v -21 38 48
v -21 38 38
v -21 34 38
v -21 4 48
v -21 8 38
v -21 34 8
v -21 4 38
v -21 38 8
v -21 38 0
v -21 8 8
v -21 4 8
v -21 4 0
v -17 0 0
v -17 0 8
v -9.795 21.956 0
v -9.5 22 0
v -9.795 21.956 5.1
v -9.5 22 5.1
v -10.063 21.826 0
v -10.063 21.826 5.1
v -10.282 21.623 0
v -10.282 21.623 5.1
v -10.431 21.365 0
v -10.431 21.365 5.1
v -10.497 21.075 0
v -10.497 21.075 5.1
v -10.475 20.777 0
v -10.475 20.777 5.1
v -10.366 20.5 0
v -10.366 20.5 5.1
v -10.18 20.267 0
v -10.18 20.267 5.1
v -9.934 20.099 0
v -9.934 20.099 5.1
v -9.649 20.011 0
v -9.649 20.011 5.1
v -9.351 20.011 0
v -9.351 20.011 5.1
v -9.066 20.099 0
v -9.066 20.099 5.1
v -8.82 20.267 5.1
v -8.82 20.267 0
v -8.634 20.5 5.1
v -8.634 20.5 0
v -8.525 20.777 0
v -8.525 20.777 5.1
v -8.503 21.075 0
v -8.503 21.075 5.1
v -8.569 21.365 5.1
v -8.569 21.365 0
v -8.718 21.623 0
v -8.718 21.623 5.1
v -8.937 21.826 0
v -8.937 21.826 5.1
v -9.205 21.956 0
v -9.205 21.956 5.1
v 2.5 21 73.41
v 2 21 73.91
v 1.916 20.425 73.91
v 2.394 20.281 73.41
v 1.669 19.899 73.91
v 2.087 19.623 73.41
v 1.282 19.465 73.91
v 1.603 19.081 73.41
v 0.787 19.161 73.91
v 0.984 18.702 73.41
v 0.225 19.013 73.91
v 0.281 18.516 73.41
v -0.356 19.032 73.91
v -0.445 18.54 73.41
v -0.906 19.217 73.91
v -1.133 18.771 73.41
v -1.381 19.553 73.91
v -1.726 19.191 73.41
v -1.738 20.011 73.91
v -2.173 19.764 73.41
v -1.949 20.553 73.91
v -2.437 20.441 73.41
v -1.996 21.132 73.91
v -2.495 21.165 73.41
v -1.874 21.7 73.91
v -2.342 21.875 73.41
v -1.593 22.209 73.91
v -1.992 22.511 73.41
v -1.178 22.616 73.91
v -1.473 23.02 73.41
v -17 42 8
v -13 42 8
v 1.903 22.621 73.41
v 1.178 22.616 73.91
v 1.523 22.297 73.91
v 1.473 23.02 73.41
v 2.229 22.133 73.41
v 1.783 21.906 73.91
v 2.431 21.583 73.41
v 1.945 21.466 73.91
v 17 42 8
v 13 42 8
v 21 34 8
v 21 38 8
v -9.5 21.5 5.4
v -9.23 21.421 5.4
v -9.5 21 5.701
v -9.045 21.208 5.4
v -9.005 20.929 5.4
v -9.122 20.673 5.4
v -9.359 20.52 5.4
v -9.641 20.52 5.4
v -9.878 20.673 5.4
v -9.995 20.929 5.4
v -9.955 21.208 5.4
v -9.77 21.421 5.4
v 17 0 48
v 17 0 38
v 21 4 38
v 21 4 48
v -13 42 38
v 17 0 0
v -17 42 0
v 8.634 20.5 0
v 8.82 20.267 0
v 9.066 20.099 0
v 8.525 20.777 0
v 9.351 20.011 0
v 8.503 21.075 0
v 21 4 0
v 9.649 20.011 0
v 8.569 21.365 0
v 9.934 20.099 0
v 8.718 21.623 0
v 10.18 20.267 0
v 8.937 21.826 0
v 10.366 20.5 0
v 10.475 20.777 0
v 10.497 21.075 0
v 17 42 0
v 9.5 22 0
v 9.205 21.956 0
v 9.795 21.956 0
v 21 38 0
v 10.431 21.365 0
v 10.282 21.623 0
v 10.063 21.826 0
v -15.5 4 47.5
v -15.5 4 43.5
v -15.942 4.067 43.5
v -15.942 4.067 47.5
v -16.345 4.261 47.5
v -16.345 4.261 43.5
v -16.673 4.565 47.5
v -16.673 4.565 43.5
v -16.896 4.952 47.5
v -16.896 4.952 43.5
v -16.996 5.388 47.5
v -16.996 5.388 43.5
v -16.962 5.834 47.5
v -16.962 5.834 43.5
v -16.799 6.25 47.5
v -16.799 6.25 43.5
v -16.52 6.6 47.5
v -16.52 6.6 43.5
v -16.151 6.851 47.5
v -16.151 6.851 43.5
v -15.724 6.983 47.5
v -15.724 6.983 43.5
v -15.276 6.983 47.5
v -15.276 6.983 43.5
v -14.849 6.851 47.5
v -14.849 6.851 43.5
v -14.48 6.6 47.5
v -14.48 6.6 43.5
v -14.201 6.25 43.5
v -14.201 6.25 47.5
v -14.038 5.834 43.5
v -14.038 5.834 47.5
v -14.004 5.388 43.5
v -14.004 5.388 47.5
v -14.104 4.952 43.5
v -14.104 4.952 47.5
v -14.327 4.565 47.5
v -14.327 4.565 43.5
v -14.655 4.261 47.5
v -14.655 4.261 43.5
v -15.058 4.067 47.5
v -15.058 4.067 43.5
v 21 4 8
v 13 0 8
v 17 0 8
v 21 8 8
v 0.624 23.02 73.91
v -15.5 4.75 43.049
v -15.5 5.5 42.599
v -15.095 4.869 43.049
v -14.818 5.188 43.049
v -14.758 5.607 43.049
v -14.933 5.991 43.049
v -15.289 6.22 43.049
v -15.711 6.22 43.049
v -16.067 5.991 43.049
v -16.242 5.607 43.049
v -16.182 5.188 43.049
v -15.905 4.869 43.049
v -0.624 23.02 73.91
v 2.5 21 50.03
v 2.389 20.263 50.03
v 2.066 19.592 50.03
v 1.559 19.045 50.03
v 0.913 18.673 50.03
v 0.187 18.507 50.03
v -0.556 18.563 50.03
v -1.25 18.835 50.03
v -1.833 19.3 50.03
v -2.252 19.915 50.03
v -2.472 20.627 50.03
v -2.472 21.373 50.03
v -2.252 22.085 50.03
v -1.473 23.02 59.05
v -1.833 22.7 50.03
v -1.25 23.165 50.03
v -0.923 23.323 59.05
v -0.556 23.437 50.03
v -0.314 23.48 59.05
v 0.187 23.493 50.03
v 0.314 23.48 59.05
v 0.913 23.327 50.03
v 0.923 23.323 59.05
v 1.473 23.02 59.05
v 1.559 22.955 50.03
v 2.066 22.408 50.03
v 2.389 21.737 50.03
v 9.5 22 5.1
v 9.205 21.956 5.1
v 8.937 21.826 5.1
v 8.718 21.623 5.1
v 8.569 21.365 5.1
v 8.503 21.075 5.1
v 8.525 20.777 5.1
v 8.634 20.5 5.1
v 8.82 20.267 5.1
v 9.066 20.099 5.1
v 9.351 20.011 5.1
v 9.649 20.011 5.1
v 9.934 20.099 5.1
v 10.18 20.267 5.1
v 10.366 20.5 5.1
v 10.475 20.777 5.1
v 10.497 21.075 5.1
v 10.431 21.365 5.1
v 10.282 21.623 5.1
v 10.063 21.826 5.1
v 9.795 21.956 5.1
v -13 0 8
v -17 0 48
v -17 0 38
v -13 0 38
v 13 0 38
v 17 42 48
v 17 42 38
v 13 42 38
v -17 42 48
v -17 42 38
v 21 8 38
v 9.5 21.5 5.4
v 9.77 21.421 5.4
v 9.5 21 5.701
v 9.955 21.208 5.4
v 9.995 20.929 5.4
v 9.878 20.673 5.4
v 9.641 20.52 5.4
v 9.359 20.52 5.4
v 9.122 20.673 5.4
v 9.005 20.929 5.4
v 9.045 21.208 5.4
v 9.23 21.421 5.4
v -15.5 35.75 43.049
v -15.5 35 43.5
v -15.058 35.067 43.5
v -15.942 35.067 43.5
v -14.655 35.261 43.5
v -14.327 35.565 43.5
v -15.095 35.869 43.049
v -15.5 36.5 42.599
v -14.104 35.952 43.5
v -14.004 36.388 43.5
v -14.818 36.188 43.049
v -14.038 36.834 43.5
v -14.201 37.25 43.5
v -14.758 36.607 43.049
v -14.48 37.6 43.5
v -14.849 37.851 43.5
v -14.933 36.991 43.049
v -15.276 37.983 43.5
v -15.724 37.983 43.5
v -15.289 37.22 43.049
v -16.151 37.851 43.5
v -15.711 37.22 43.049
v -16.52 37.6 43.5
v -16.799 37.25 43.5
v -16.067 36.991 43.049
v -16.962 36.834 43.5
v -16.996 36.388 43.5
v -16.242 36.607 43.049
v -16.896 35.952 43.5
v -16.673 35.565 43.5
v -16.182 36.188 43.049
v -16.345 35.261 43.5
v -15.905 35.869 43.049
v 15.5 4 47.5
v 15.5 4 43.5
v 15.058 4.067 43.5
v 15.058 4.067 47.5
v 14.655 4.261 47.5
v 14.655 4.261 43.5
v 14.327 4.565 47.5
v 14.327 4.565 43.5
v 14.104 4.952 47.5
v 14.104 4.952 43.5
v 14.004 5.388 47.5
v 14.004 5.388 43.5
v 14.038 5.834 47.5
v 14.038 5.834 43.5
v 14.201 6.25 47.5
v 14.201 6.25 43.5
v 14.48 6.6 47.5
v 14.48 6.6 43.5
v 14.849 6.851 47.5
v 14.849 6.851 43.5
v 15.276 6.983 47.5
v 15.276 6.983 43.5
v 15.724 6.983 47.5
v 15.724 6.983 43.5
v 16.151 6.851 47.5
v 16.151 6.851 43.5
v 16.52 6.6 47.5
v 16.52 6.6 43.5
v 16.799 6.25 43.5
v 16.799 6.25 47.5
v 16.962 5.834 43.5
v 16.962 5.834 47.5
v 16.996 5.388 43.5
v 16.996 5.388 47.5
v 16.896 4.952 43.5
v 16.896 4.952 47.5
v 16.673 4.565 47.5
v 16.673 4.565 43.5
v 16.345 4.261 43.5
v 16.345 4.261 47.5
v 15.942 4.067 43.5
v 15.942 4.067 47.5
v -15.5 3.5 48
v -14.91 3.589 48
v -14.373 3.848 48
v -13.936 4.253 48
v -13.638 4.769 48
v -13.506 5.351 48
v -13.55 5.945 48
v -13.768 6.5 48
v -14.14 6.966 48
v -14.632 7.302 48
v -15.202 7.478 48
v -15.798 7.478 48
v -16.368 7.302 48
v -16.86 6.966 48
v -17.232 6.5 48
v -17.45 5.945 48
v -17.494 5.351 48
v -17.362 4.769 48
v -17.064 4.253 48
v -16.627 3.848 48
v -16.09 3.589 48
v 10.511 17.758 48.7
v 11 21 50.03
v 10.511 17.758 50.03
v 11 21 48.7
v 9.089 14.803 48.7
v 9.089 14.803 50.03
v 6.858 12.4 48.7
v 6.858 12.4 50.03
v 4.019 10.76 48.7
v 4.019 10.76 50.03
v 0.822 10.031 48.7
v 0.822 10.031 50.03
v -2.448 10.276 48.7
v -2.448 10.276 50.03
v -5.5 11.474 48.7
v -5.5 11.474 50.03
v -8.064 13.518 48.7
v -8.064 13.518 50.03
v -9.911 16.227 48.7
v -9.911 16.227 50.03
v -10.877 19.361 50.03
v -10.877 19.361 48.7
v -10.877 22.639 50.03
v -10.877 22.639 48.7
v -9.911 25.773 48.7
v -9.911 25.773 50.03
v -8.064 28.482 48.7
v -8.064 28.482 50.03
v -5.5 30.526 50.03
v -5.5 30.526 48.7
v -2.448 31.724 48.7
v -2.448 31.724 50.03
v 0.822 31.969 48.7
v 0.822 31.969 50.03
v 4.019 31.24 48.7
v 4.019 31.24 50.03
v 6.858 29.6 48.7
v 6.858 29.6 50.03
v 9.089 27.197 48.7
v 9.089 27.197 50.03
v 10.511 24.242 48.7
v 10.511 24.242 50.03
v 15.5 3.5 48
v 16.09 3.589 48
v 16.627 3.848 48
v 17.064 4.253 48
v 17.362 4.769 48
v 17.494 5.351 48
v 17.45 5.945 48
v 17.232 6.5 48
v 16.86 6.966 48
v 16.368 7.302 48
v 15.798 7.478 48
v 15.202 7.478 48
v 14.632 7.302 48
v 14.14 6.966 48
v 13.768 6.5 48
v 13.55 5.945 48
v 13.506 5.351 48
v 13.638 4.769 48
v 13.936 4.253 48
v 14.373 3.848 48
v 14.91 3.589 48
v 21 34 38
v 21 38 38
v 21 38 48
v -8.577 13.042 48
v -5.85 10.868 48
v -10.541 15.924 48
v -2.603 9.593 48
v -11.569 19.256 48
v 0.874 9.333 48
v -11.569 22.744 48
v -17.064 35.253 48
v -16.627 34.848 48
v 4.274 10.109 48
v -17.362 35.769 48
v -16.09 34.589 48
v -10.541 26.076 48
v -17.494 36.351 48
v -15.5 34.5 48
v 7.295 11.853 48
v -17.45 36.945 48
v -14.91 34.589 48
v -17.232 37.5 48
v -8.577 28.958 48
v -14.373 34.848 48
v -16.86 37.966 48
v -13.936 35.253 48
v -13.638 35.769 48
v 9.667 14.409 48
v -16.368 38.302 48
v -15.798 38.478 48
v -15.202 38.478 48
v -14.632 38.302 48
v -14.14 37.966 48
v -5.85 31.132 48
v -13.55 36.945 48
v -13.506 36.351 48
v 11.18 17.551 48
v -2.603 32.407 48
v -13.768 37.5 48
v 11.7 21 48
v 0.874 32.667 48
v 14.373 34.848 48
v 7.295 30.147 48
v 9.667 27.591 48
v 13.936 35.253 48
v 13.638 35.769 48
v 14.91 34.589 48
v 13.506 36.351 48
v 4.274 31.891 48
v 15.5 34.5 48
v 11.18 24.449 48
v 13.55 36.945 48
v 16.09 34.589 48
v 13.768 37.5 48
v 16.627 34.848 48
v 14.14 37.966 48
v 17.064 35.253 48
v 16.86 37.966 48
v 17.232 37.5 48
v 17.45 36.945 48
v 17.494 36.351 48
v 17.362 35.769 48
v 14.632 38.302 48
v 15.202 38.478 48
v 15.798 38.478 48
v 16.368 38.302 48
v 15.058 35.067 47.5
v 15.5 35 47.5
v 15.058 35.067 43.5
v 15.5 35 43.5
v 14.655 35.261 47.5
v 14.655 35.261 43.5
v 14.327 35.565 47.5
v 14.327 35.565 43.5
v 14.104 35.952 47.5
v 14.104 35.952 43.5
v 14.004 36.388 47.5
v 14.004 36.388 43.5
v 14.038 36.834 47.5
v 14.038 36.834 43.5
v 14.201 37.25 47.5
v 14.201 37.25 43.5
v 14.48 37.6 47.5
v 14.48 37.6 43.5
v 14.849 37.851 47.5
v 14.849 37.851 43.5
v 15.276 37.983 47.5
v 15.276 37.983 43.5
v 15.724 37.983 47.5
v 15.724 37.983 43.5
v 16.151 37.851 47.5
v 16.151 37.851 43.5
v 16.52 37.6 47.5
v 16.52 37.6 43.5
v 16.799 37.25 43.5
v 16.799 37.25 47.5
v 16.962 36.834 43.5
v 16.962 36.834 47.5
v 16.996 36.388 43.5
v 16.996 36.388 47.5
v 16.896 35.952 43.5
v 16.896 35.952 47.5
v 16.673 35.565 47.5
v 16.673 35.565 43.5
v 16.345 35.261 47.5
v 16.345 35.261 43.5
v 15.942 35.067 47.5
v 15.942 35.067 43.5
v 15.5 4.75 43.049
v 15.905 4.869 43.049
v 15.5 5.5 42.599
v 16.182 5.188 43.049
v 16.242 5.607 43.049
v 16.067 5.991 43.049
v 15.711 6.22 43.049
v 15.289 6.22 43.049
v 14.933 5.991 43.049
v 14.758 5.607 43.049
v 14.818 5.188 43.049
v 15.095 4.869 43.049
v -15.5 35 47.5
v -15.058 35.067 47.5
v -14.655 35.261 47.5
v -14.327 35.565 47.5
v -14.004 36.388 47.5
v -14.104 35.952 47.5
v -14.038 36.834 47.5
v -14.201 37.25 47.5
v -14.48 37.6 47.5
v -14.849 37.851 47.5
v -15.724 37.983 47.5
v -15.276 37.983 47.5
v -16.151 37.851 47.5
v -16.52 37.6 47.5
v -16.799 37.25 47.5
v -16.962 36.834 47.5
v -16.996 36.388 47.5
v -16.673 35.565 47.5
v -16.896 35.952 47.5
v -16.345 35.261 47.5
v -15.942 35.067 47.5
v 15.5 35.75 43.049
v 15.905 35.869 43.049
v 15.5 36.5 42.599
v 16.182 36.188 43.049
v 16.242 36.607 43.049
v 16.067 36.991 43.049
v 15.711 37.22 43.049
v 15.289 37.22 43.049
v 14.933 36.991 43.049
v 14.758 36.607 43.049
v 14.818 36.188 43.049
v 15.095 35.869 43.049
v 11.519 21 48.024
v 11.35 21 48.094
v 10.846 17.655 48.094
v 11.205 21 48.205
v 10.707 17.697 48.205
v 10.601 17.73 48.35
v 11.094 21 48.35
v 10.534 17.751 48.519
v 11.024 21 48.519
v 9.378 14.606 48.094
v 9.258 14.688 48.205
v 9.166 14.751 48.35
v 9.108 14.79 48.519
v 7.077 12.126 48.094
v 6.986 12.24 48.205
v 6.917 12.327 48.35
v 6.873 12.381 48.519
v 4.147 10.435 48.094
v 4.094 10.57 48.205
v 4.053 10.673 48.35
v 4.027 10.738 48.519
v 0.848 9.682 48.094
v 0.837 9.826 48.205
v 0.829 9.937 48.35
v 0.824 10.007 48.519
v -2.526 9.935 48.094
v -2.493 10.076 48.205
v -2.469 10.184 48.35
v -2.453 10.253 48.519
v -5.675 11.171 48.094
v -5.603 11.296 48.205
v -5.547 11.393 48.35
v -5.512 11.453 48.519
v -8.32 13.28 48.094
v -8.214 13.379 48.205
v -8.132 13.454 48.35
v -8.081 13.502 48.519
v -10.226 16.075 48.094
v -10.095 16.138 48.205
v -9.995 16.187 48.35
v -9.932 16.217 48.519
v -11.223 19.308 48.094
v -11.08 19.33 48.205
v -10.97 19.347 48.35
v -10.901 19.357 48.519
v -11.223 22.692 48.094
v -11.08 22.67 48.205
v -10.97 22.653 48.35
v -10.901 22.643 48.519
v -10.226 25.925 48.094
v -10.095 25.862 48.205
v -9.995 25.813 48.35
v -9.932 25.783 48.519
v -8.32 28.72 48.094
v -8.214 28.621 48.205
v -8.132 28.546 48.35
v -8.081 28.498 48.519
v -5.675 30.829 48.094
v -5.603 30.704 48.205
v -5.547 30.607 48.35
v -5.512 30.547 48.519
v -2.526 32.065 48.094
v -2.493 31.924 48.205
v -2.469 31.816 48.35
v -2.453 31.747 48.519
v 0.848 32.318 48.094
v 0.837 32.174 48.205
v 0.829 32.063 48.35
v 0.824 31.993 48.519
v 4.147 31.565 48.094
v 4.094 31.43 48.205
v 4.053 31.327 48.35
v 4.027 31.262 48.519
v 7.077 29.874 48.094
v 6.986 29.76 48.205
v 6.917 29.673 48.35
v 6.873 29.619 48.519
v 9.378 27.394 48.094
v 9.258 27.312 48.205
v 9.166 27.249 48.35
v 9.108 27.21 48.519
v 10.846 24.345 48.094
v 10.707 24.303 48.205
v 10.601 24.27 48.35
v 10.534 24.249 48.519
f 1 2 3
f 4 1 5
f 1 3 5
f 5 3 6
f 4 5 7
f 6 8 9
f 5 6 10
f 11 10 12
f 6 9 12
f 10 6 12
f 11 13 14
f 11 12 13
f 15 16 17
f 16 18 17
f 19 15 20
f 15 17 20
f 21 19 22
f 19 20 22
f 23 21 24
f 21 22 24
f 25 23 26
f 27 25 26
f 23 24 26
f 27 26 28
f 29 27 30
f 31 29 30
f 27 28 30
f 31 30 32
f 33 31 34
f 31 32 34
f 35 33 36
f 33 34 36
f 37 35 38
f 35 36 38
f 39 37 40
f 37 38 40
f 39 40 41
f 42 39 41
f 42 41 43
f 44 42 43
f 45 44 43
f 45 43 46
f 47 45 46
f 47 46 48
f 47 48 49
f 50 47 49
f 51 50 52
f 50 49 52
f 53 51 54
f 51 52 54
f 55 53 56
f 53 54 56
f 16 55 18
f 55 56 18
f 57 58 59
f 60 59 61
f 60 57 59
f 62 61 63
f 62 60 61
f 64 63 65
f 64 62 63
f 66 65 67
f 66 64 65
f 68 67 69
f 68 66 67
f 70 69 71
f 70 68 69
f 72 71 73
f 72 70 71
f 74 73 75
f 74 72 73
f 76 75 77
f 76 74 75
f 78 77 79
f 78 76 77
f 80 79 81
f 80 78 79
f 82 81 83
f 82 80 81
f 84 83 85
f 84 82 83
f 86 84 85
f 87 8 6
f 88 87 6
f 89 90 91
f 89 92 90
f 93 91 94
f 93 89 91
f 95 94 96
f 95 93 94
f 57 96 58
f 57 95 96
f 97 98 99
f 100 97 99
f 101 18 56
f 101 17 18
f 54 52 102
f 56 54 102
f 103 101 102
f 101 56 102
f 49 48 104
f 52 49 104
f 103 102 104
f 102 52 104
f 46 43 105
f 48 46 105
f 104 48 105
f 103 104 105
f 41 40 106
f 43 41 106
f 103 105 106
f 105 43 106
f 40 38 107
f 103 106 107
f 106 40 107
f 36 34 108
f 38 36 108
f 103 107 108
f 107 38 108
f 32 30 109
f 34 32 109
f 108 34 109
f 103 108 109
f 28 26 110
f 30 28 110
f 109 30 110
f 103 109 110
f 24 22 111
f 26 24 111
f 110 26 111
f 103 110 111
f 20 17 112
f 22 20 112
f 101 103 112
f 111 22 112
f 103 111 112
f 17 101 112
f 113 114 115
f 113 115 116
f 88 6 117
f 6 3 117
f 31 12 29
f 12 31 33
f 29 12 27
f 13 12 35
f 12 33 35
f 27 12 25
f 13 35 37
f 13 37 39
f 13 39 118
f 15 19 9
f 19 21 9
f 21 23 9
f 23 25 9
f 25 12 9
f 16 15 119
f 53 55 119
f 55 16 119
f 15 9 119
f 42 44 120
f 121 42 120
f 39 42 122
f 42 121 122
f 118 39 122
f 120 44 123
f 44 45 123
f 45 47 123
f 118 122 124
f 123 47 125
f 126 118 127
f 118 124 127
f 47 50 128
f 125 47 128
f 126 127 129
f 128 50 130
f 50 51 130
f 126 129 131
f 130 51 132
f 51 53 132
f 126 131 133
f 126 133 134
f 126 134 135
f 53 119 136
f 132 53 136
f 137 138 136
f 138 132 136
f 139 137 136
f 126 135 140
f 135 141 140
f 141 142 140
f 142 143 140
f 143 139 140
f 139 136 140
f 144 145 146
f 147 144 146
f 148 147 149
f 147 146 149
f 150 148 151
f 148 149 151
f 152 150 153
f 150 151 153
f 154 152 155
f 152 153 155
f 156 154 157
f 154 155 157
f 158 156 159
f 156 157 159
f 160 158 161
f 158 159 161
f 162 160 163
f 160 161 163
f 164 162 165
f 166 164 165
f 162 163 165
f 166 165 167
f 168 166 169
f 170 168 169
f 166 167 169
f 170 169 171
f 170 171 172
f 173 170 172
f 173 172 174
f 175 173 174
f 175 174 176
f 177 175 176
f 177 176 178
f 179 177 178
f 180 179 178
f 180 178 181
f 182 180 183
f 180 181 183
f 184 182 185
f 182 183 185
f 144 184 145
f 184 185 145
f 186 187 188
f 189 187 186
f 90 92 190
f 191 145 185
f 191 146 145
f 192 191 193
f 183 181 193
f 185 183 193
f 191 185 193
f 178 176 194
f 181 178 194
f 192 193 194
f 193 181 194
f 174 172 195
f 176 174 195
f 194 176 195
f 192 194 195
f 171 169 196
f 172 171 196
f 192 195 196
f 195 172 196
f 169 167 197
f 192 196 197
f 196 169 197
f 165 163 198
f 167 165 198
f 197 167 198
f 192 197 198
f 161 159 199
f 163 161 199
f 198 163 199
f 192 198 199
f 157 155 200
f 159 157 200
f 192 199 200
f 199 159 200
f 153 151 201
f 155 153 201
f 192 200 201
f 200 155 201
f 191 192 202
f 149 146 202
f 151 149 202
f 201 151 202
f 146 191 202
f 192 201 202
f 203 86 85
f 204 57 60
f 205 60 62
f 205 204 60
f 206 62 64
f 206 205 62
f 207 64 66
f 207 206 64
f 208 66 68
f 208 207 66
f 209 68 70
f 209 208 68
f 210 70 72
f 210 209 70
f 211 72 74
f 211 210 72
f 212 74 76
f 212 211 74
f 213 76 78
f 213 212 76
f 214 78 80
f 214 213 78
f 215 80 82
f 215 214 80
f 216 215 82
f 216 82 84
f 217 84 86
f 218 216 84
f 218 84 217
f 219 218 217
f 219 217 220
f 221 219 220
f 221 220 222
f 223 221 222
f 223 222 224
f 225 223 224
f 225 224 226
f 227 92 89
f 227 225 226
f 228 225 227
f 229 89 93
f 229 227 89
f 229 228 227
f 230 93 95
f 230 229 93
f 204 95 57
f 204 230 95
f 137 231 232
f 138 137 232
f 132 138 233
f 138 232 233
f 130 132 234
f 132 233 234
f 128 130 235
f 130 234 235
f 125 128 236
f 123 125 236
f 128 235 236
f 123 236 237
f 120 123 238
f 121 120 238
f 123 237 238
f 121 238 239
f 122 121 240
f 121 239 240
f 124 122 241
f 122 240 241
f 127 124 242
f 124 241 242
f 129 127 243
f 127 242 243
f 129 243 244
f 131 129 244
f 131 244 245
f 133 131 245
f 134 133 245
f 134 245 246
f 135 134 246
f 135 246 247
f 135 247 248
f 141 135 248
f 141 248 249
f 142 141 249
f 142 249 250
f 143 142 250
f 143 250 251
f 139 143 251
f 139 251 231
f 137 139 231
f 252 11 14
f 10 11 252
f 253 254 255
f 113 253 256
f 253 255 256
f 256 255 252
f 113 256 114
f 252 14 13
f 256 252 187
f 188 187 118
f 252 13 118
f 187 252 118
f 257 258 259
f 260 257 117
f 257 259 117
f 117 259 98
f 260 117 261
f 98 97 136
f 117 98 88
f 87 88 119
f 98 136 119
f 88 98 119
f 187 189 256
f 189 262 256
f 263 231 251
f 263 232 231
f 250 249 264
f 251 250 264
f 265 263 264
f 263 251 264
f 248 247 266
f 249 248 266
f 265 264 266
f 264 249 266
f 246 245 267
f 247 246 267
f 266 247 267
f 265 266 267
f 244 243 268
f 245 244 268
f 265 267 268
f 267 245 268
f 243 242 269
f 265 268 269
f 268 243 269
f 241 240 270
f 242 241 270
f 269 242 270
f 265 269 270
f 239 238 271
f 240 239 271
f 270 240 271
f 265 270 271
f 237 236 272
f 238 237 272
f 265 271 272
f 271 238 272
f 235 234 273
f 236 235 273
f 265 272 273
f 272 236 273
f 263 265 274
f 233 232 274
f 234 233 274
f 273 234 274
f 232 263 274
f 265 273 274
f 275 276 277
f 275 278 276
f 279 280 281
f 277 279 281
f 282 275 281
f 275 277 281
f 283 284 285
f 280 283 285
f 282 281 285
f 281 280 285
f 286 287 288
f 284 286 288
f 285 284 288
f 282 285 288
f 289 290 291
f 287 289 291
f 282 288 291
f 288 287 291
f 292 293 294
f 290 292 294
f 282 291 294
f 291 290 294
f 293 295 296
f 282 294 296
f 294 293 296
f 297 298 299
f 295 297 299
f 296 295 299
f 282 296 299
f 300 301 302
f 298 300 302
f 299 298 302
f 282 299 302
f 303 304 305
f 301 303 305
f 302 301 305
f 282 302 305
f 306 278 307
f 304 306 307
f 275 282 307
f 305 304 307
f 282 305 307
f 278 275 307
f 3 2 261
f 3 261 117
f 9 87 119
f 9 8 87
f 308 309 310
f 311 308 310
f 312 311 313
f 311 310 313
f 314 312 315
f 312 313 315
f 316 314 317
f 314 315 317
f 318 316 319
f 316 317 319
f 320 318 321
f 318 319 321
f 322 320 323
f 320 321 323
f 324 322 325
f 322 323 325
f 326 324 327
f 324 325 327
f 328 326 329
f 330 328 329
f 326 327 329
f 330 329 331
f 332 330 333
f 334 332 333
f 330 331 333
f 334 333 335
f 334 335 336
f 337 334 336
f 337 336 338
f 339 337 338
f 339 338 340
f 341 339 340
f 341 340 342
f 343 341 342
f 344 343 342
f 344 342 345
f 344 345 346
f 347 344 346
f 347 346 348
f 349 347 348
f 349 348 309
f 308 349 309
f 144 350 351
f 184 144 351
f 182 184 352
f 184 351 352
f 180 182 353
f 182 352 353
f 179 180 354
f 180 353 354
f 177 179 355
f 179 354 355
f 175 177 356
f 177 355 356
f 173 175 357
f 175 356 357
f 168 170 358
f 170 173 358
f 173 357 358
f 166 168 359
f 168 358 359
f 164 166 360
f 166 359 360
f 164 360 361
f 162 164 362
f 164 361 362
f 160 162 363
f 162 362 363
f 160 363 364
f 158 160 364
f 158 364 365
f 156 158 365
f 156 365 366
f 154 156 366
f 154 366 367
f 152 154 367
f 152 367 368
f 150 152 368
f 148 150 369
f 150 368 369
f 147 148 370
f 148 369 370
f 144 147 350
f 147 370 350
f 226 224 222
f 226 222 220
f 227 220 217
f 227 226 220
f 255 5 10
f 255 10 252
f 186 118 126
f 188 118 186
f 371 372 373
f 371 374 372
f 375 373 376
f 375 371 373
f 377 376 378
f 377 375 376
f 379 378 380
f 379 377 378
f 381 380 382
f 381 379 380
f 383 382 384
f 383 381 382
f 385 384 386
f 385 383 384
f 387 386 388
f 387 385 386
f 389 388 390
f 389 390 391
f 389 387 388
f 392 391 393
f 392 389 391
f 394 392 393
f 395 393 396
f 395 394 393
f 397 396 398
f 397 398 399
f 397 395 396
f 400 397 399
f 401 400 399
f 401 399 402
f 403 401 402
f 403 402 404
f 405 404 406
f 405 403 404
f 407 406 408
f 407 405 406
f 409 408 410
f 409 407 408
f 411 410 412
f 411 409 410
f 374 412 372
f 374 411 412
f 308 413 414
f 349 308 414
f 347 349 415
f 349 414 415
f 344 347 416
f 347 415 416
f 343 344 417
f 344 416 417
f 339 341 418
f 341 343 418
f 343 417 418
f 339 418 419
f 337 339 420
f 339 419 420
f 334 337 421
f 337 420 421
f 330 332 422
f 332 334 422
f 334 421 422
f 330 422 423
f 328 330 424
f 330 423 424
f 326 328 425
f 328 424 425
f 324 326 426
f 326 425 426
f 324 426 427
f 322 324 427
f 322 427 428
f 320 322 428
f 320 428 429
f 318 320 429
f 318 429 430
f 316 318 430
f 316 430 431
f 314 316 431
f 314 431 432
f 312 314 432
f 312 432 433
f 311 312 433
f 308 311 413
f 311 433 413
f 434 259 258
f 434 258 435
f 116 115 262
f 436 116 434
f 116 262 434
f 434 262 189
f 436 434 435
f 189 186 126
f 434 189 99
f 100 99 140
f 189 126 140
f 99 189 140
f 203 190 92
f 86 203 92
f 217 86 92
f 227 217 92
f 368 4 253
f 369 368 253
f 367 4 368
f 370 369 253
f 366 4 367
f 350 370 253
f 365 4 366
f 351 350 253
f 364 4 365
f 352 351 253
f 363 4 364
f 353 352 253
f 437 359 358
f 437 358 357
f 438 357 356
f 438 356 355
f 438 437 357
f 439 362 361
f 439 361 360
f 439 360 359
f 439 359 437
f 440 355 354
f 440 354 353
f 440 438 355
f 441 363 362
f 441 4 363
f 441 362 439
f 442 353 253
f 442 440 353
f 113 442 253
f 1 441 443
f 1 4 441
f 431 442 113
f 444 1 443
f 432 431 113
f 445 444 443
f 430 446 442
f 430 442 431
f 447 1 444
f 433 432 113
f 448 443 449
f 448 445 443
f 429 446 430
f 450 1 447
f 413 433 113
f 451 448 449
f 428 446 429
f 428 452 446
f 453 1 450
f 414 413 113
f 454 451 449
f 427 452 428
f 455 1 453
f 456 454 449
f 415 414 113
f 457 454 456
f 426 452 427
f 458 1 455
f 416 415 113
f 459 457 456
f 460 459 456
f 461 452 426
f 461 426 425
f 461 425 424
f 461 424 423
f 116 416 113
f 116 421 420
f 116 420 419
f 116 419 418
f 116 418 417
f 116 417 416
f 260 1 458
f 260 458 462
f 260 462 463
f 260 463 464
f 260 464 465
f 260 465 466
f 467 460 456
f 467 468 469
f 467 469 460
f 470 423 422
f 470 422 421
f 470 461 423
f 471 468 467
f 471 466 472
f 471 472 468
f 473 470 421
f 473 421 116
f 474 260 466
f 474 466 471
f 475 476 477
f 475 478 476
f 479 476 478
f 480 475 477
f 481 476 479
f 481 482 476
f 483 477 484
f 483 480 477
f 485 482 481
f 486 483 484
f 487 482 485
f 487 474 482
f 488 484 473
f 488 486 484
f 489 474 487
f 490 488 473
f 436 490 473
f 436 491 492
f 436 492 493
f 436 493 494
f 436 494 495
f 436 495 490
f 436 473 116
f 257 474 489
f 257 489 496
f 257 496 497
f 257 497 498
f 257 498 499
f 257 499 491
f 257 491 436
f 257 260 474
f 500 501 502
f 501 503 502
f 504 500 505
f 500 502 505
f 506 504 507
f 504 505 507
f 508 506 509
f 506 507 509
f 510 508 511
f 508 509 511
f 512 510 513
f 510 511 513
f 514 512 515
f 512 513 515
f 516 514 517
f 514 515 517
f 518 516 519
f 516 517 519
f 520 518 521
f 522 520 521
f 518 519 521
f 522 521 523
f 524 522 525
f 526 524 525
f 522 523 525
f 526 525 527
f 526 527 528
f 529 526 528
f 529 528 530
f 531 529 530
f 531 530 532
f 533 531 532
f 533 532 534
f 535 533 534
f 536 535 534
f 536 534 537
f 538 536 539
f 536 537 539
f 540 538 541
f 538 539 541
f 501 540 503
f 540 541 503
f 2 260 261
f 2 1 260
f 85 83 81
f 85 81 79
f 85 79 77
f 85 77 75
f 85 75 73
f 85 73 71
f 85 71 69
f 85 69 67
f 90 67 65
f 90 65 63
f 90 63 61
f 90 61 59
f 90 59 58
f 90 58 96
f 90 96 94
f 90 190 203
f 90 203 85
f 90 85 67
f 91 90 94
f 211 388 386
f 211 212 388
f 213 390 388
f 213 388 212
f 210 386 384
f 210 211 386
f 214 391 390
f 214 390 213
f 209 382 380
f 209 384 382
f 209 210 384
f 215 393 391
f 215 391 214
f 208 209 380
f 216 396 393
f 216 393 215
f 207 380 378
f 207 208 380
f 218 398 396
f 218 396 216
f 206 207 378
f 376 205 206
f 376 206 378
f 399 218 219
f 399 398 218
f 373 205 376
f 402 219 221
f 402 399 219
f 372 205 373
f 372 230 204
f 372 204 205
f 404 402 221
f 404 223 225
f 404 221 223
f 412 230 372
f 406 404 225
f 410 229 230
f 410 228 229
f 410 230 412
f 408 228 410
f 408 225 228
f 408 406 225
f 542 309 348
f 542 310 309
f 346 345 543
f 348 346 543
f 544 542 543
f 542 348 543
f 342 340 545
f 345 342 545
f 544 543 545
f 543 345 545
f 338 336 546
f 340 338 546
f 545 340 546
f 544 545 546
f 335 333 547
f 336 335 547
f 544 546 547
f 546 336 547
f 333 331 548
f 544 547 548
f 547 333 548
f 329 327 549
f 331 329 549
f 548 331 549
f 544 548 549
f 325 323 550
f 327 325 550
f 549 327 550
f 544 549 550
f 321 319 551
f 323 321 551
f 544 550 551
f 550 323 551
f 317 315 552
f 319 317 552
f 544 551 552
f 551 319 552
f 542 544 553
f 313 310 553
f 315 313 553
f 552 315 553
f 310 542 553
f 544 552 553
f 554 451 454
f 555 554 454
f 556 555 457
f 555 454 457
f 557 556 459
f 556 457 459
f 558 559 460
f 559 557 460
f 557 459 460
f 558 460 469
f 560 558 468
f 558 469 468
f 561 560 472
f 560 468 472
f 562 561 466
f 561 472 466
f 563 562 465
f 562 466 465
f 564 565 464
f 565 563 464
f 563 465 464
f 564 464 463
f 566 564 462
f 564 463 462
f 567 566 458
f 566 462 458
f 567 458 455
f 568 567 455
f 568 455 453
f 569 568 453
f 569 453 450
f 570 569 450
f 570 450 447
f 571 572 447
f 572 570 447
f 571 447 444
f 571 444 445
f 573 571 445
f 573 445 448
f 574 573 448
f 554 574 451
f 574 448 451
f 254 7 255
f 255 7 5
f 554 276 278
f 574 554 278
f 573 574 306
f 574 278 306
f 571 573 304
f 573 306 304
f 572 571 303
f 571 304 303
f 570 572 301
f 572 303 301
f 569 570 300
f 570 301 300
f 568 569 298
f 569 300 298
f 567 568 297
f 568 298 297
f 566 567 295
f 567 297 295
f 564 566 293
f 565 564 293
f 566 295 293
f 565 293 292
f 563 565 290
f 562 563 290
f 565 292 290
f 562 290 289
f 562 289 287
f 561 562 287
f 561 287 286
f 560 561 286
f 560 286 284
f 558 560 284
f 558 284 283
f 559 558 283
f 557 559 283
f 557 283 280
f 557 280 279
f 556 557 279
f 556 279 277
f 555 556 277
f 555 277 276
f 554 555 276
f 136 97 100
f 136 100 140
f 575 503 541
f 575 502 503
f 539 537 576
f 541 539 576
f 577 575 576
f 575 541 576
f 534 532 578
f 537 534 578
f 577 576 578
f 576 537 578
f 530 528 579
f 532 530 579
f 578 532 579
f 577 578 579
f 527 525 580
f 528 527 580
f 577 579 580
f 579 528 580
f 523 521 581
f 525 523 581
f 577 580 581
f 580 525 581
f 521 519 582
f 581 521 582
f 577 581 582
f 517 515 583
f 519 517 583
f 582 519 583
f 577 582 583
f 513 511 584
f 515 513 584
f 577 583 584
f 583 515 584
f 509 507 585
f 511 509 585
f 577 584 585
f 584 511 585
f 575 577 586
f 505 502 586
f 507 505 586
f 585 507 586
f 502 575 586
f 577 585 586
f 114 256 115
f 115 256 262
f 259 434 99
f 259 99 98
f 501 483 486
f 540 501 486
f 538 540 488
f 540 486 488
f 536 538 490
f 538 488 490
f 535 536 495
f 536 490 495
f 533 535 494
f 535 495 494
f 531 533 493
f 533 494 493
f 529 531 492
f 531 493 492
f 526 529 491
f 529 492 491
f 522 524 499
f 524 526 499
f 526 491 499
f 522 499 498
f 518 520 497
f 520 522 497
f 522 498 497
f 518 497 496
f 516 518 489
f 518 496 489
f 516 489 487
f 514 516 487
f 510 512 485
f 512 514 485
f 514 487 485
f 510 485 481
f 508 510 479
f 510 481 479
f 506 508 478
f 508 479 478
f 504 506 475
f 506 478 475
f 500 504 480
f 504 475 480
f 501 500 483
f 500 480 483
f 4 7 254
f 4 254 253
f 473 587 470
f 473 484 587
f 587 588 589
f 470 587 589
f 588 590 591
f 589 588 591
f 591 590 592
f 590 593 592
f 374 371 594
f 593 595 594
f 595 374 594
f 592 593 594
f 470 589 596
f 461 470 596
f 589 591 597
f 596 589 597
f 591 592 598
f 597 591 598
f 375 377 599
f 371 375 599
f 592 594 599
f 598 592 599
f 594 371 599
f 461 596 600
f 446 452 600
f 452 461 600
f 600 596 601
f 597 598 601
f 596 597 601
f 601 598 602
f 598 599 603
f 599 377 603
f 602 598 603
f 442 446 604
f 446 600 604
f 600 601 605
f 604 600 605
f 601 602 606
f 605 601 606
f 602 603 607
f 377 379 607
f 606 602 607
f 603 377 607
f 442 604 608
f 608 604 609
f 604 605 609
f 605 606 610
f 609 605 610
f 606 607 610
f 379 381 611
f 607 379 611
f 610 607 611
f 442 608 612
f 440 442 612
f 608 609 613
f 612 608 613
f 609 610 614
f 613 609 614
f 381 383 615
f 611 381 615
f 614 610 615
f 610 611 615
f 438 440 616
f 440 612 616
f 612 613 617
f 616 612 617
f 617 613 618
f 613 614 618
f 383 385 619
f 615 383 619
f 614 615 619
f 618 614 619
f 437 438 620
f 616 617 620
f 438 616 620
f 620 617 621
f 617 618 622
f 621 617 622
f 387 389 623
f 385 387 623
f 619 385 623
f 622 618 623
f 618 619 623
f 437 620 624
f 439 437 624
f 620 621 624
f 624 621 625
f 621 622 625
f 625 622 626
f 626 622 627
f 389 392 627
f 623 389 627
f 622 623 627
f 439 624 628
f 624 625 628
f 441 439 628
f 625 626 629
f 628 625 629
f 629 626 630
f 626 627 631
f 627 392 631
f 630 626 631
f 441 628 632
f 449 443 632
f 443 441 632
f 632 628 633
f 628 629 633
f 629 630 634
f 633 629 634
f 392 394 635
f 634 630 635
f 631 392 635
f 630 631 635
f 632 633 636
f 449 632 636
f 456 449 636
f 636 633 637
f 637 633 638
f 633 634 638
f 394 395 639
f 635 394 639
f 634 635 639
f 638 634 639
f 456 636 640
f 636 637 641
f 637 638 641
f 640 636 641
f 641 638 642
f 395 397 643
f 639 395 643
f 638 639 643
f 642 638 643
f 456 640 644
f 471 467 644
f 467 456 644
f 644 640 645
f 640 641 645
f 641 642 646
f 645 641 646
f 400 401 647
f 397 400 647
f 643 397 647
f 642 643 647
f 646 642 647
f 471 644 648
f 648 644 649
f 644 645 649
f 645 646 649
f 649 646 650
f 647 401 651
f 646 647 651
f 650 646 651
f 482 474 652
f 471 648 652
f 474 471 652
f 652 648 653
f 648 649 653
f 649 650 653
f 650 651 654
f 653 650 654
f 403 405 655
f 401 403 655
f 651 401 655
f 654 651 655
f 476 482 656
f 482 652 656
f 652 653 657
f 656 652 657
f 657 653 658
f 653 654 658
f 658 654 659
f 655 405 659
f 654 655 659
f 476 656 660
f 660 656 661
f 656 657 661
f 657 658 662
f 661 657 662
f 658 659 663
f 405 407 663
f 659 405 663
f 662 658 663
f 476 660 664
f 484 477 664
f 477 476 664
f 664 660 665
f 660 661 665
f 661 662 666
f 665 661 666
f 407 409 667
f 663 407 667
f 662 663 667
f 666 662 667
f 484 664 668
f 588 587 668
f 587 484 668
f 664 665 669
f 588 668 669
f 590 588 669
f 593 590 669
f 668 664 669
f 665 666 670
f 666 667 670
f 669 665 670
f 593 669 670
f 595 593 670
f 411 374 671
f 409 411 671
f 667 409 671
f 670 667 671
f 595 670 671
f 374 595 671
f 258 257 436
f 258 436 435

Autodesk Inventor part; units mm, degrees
ref_plane "YZ Plane" through (0, 0, 0) normal (1, 0, 0) x (0, 1, 0)
ref_plane "XZ Plane" through (0, 0, 0) normal (0, 1, 0) x (-1, 0, 0)
ref_plane "XY Plane" through (0, 0, 0) normal (0, 0, 1) x (1, 0, 0)
sketch "Sketch1" plane through (0, 0, 0) normal (0, 0, 1) x (1, 0, 0)
  line L0 (21, 42) -> (-21, 42)
  line L1 (-21, 42) -> (-21, 0)
  line L2 (-21, 0) -> (21, 0)
  line L3 (21, 0) -> (21, 42)
  point P0 (0, 0)
  point P1 (0, 0)
  dimension "d0" = 42
  dimension "d1" = 42
extrude "Extrusion1" add sketch "Sketch1" along normal blind 48
ref_plane "Work Plane1" through (0, 0, 38) normal (0, 0, 1) x (1, 0, 0)
sketch "Sketch2" plane through (0, 0, 38) normal (0, 0, 1) x (1, 0, 0)
  line L0 (21, 42) -> (-21, 42)
  line L1 (-21, 42) -> (-21, 0)
  line L2 (-21, 0) -> (21, 0)
  line L3 (21, 0) -> (21, 42)
  line L4 (-21, 42) -> (-21, 0) projected
  line L5 (-21, 34) -> (-13, 42)
  line L6 (21, 42) -> (-21, 42) projected
  line L7 (0, 50.0167) -> (0, -8.0167)
  line L8 (-21, 21) -> (21, 21)
  line L9 (21, 34) -> (13, 42)
  line L10 (-21, 8) -> (-13, 0)
  line L11 (21, 8) -> (13, 0)
  line L12 (-21, 34) -> (-21, 42)
  line L13 (-13, 42) -> (-21, 42)
  line L14 (13, 42) -> (21, 42)
  line L15 (21, 42) -> (21, 34)
  line L16 (21, 8) -> (21, 0)
  line L17 (21, 0) -> (21, 42) projected
  line L18 (-21, 0) -> (21, 0) projected
  line L19 (21, 0) -> (13, 0)
  line L20 (-13, 0) -> (-21, 0)
  line L21 (-21, 0) -> (-21, 8)
  point P0 (0, 0)
  point P1 (0, 21)
  dimension "d5" = 8
  dimension "d6" = 8
  dimension "d7" = 42
extrude "Extrusion2" cut sketch "Sketch2" against normal blind 30 contours L3 L9 L0 | L5 L1 L0 | L3 L2 L11 | L2 L1 L10
chamfer "Chamfer1" distance 4 angle 45 8 edges at (-21, 42, 43) (21, 42, 43) (21, 0, 43) (-21, 0, 43) (-21, 42, 4) (21, 42, 4) (-21, 0, 4) (21, 0, 4)
sketch "Sketch3" plane through (0, 0, 48) normal (0, 0, 1) x (1, 0, 0)
  line L0 (21, 38) -> (21, 4) projected
  line L1 (-17, 42) -> (17, 42) projected
  line L2 (-21, 4) -> (-21, 38) projected
  line L3 (0, 42) -> (0, 0)
  line L4 (-21, 21) -> (21, 21)
  point P0 (-15.5, 5.5)
  point P1 (15.5, 5.5)
  point P2 (-15.5, 36.5)
  point P3 (15.5, 36.5)
  dimension "d13" = 31
  dimension "d14" = 31
hole "Hole1" at (-15.5, 5.5, 48) at (15.5, 5.5, 48) at (-15.5, 36.5, 48) at (15.5, 36.5, 48) direction (0, 0, -1) diameter 3 depth 4.5 tip angle 118 countersink diameter 4 countersink angle 90
sketch "Sketch5" plane through (0, 0, 0) normal (0, 0, -1) x (-1, 0, 0)
  line L0 (17, 0) -> (-17, 0) projected
  line L1 (17, 42) -> (-17, 42) projected
  line L2 (0, 42) -> (0, 0)
  point P0 (-9.5, 21)
  point P1 (9.5, 21)
  dimension "d28" = 19
hole "Hole2" at (9.5, 21, 0) at (-9.5, 21, 0) direction (0, 0, 1) diameter 2 depth 5.1 tip angle 118
sketch "Sketch6" plane through (0, 0, 48) normal (0, 0, 1) x (1, 0, 0)
  line L0 (-17, 42) -> (17, 42) projected
  line L1 (-21, 4) -> (-21, 38) projected
  line L2 (0, 42) -> (0, 0)
  circle A0 centre (0, 21) radius 11
  dimension "d36" = 22
extrude "Extrusion4" add sketch "Sketch6" along normal blind 2.03
fillet "Fillet1" radius 0.7 1 edges at (-11, 21, 48)
sketch "Sketch7" plane through (0, 21, 50.03) normal (0, 0, 1) x (1, 0, 0)
  circle A0 centre (0, 0) radius 11 projected
  circle A1 centre (0, 0) radius 2.5
  point P0 (0, -21)
  dimension "d40" = 5
extrude "Extrusion5" add sketch "Sketch7" along normal blind 23.88 contours A1
sketch "Sketch8" plane through (0, 21, 73.91) normal (0, 0, 1) x (1, 0, 0)
  line L0 (-1.473, 2.02) -> (1.473, 2.02)
  circle A0 centre (0, 0) radius 2.5 projected
  circle A1 centre (0, 0) radius 2.5 projected
  circle A2 centre (0, 0) radius 2.5 projected
  arc A3 (1.473, 2.02) -> (-1.473, 2.02) centre (0, 0) ccw
  point P0 (0, -21)
extrude "Extrusion6" cut sketch "Sketch8" against normal blind 14.86 contours A0 L0 picked at (0.3249, 2.2492)
chamfer "Chamfer2" distance 0.5 angle 45 2 edges at (-1.1331, 18.7715, 73.91) (2.2285, 22.1331, 73.91)
properties part number "nema 17 stepper motor (triple stack)"
